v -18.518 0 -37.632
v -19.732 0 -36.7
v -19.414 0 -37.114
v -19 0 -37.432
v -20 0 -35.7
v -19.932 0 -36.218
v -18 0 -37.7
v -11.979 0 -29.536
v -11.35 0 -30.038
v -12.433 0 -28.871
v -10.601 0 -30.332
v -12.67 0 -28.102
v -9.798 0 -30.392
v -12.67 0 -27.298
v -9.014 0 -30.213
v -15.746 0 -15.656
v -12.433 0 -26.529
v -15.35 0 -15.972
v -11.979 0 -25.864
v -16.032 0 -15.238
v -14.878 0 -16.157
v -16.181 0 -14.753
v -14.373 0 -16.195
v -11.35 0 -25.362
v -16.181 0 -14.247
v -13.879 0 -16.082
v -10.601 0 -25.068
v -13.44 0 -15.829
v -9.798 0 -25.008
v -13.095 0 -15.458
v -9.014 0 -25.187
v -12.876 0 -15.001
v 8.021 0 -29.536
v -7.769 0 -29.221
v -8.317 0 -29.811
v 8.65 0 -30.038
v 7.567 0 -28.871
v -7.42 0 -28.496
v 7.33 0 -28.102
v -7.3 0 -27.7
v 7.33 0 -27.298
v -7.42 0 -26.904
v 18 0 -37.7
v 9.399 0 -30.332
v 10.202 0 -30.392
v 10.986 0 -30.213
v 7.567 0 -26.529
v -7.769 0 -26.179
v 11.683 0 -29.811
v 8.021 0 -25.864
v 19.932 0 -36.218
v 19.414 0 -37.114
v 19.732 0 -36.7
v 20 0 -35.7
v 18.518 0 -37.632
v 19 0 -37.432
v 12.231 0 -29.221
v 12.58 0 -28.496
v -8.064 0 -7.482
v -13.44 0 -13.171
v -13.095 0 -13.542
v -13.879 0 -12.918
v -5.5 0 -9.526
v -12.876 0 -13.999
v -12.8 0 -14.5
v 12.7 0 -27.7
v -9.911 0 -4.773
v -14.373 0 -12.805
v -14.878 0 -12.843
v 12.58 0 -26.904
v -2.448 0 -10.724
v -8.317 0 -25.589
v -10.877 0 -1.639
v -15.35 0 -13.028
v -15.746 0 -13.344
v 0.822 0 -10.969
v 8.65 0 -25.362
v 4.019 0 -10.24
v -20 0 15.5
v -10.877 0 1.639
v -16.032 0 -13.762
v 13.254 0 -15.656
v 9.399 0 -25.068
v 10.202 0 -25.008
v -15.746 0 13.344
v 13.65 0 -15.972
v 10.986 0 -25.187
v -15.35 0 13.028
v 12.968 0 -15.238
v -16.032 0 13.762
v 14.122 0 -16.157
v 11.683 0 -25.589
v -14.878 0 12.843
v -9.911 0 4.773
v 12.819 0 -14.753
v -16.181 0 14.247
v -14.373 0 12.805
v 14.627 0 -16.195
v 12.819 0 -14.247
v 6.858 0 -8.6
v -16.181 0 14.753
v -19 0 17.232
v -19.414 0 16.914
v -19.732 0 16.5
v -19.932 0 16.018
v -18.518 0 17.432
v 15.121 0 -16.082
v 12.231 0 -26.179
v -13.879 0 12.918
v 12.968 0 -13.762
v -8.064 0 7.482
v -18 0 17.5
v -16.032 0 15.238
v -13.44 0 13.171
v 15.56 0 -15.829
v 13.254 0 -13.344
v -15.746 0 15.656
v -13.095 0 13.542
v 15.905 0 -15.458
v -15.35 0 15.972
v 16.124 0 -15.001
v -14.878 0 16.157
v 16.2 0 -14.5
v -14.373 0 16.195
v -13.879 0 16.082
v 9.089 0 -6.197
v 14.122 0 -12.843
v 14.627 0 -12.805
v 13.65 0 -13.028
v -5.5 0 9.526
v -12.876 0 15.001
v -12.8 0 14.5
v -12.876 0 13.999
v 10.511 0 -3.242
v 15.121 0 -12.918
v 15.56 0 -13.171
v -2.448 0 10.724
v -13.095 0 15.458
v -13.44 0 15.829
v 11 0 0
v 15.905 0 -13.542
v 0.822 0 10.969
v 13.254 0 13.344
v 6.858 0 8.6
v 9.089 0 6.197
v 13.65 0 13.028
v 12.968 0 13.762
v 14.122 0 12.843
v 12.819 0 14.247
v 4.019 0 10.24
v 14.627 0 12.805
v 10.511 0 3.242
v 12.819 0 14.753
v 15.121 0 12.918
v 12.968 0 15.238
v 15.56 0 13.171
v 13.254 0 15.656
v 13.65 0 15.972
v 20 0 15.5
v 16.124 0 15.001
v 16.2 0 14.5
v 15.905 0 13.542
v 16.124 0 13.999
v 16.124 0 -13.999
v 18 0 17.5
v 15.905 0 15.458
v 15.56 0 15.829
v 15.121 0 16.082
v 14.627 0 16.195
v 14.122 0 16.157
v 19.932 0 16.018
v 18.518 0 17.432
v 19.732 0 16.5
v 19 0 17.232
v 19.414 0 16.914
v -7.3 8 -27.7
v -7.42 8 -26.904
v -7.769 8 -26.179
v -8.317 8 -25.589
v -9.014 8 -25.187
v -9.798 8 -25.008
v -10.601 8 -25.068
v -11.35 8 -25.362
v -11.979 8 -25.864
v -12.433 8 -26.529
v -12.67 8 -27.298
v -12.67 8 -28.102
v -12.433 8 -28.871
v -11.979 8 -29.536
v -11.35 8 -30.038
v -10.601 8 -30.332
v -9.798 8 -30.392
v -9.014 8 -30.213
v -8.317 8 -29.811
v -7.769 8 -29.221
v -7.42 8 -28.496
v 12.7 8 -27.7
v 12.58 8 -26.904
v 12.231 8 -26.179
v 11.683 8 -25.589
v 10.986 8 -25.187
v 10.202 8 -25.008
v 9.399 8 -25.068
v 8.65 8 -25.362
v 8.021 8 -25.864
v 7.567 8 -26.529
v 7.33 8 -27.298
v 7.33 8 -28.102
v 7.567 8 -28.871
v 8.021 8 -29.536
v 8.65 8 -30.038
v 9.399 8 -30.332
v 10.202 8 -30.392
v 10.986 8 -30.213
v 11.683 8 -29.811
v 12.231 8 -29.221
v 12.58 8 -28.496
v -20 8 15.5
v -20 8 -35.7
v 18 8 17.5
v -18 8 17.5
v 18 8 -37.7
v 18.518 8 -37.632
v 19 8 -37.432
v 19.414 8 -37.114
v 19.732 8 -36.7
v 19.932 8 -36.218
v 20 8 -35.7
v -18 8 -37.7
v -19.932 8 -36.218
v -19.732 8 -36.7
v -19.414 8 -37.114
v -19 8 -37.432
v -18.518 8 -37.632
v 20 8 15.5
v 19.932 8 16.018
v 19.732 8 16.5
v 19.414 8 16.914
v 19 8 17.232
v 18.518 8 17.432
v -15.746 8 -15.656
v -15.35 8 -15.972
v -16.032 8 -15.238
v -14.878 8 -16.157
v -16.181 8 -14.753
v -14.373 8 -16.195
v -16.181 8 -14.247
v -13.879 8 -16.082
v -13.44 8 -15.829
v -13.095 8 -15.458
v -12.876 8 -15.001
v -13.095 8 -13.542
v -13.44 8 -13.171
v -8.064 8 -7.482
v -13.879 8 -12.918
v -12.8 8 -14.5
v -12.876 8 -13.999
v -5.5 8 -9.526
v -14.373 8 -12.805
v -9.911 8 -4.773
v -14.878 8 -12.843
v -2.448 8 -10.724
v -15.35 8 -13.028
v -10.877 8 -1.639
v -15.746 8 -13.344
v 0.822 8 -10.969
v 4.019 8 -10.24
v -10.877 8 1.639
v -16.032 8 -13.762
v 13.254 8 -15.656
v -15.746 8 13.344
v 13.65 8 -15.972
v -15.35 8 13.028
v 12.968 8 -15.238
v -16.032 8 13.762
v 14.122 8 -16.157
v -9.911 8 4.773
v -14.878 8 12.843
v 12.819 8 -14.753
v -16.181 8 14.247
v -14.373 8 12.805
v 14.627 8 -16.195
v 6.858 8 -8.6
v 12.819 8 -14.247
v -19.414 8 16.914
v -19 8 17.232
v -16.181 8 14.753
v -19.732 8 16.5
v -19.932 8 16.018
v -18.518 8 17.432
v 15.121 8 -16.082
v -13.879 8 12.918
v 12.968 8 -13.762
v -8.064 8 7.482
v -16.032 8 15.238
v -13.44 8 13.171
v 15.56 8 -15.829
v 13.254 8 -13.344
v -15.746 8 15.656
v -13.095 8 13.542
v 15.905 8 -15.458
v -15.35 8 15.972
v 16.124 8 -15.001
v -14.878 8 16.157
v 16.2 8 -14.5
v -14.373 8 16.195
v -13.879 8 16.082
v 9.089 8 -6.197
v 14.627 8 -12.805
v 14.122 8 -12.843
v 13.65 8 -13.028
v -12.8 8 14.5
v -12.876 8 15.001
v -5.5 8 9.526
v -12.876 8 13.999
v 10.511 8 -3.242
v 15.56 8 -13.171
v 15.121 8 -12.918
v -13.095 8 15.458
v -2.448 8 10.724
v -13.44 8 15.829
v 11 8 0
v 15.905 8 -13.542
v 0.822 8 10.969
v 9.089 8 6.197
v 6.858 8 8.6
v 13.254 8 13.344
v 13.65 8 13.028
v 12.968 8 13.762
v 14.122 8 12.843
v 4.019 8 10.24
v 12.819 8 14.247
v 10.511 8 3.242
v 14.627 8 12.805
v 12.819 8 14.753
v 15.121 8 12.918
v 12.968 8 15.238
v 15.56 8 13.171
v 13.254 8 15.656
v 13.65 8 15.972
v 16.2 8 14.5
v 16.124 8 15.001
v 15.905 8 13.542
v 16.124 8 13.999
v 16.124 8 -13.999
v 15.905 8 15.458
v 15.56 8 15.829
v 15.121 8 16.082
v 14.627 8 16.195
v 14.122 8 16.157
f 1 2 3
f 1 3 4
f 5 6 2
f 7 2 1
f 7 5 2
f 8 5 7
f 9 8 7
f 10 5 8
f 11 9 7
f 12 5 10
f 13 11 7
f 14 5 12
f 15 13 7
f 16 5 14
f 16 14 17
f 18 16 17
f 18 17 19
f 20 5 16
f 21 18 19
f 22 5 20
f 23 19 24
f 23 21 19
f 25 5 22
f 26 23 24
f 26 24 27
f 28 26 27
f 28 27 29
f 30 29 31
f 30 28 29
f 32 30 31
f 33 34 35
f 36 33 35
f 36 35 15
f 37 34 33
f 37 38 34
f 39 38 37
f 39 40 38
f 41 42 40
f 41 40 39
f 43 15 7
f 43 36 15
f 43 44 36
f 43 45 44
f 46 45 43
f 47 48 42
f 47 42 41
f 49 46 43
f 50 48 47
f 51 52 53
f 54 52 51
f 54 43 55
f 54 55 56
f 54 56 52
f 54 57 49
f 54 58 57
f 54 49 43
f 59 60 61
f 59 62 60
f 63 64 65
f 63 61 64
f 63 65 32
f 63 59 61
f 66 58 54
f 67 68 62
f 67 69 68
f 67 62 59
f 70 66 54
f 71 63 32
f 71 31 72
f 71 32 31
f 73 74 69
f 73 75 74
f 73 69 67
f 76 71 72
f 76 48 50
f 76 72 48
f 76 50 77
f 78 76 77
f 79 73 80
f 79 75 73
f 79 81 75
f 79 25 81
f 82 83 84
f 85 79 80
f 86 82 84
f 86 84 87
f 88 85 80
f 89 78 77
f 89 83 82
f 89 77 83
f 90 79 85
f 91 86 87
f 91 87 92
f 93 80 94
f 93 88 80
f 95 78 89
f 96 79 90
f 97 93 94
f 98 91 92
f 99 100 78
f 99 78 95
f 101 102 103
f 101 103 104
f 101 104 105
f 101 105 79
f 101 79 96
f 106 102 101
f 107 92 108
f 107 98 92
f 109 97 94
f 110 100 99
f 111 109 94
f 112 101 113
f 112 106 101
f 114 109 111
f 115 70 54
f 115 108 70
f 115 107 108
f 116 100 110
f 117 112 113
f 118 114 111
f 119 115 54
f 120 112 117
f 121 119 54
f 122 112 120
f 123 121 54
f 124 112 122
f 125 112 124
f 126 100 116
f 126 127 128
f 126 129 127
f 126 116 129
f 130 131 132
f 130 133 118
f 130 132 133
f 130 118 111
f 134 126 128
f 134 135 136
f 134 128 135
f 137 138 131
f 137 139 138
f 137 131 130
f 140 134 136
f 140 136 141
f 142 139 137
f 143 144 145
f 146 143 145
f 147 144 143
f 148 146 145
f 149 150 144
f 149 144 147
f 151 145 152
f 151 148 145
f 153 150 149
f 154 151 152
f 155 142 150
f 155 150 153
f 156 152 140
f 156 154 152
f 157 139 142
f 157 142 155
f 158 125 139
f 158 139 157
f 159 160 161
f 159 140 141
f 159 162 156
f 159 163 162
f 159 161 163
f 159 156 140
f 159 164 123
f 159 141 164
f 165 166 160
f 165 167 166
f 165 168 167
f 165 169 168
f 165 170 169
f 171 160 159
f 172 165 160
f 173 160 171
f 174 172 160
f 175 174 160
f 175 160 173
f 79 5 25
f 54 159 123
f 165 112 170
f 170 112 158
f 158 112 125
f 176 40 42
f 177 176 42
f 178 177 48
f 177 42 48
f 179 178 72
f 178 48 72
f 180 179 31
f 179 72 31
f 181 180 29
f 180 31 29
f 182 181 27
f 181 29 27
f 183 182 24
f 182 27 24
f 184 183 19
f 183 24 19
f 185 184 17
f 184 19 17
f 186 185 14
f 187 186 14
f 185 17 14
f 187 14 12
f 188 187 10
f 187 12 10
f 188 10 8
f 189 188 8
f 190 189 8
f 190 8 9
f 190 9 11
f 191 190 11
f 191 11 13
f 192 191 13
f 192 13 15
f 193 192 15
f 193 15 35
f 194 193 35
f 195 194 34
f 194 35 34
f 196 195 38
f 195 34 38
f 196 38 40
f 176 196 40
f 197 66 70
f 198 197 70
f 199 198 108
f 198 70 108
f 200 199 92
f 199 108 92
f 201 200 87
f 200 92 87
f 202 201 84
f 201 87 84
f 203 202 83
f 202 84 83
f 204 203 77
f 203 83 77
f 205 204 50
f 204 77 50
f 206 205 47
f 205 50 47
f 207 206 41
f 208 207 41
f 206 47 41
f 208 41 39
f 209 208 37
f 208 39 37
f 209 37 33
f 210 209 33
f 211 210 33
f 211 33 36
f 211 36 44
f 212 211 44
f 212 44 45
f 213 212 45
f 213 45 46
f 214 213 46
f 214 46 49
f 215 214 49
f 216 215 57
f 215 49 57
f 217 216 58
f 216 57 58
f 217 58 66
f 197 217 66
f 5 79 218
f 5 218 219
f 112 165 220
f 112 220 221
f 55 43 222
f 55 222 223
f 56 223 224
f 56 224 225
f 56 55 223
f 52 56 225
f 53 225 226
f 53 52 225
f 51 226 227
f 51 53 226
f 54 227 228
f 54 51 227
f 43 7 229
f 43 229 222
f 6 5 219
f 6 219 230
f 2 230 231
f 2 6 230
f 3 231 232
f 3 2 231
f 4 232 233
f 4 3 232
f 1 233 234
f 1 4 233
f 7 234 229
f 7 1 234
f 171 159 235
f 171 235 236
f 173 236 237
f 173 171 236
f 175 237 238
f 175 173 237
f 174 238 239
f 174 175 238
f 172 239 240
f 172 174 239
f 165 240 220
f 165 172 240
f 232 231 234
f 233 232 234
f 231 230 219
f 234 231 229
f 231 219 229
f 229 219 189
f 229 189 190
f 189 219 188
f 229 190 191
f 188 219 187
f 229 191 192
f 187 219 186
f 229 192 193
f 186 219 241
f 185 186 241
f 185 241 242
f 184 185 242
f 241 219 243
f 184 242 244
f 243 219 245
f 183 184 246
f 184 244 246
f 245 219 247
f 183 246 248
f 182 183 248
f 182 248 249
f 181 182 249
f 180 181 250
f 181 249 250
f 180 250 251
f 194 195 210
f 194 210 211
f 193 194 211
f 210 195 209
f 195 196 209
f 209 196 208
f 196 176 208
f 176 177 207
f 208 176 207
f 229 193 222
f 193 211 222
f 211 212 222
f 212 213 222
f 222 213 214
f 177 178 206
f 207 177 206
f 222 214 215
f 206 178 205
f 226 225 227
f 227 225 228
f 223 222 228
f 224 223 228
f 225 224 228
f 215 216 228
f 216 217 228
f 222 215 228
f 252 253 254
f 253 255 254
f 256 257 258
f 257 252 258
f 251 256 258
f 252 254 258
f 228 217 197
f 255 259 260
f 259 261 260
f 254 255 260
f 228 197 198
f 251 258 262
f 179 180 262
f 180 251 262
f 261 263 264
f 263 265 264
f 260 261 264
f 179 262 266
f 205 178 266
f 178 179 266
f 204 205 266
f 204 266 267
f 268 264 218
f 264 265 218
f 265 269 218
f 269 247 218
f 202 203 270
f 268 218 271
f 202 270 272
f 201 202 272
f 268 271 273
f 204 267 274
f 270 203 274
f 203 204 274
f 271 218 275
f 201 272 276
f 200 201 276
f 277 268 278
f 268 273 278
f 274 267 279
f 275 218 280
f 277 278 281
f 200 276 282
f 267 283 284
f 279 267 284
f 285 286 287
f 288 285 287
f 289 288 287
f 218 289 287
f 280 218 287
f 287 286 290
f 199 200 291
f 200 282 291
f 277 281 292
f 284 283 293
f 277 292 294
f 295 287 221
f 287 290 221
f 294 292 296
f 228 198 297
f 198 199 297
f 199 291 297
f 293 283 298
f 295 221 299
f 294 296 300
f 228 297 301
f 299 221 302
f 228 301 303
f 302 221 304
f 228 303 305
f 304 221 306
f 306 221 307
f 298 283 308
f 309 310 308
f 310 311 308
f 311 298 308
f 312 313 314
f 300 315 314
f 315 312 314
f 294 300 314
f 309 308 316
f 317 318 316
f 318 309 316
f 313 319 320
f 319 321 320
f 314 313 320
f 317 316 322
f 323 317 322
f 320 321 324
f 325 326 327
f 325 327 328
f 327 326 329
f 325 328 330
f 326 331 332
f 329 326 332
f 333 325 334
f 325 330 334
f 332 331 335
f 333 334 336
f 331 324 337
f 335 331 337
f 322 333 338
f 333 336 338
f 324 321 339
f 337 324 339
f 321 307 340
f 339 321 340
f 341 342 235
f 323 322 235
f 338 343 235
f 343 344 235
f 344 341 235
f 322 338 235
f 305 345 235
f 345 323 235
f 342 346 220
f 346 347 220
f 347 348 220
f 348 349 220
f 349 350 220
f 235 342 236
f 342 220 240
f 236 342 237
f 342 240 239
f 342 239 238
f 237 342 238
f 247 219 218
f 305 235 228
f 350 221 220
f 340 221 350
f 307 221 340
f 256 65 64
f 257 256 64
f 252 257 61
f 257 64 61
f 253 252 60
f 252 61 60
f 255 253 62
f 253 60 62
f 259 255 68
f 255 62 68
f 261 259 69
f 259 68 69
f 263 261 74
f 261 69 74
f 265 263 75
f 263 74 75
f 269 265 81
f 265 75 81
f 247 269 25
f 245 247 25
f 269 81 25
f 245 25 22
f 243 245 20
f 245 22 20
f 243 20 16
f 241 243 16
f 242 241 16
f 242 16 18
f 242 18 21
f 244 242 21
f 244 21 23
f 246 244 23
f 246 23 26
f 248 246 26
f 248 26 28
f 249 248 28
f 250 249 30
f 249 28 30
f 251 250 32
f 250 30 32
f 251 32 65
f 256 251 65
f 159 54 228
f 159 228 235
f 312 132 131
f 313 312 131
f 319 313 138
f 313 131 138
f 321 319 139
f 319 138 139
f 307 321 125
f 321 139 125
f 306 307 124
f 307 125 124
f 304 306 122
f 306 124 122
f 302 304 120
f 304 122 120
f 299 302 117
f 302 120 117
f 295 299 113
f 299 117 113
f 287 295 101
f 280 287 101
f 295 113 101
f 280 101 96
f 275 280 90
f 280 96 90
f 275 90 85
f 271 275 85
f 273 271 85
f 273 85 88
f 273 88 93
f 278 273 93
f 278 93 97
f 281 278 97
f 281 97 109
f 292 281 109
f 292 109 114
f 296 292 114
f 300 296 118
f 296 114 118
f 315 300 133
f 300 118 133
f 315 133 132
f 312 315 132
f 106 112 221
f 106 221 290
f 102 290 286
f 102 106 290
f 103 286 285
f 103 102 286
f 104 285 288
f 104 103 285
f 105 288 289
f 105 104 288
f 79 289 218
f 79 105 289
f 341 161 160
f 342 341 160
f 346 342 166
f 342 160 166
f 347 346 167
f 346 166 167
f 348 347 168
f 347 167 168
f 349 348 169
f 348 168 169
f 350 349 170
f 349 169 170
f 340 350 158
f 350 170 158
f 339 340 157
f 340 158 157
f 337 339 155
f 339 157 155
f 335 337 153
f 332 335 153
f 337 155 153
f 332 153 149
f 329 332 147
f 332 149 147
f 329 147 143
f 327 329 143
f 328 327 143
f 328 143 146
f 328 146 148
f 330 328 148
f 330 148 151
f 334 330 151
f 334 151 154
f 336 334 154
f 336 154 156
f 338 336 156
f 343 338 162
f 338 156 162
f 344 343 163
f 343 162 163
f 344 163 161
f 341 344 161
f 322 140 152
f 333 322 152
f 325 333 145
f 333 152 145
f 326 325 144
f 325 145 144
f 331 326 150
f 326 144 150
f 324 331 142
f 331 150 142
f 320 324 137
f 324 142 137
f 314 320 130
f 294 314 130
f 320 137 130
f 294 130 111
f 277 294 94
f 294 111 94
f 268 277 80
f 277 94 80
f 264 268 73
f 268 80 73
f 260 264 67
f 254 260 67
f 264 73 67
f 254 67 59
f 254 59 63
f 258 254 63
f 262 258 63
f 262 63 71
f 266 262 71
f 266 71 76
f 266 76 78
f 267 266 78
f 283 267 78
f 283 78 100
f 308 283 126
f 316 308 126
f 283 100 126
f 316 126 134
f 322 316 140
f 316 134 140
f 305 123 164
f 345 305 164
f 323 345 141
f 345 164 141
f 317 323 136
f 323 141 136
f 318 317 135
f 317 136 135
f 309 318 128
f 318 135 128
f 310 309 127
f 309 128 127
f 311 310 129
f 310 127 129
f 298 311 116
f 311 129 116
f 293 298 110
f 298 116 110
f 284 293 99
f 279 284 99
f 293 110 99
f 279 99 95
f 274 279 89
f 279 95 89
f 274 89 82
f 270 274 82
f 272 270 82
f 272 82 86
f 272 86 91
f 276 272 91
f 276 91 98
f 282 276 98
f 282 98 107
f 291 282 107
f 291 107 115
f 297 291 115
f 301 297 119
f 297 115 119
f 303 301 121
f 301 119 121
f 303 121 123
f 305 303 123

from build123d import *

# Parameters (mm, degrees)
F0_R     = 2.7
F0_R_2   = 1.7
F0_R_3   = 11
F1_DEPTH = 8


with BuildPart() as f1:
    # F0 (on Front) → F1 (new body)
    with BuildSketch(Plane.XZ):
        with BuildLine():
            ThreePointArc((-18, 17.5), (-19.414214, 16.914214), (-20, 15.5))
            Line((-20, 15.5), (-20, -35.7))
            ThreePointArc((-20, -35.7), (-19.414214, -37.114214), (-18, -37.7))
            Line((-18, -37.7), (18, -37.7))
            ThreePointArc((18, -37.7), (19.414214, -37.114214), (20, -35.7))
            Line((20, -35.7), (20, 15.5))
            ThreePointArc((20, 15.5), (19.414214, 16.914214), (18, 17.5))
            Line((18, 17.5), (-18, 17.5))
        make_face()
        with Locations((-10, -27.7)):
            Circle(F0_R, mode=Mode.SUBTRACT)
        with Locations((-14.5, -14.5)):
            Circle(F0_R_2, mode=Mode.SUBTRACT)
        with Locations((10, -27.7)):
            Circle(F0_R, mode=Mode.SUBTRACT)
        with Locations((14.5, -14.5)):
            Circle(F0_R_2, mode=Mode.SUBTRACT)
        with Locations((-14.5, 14.5)):
            Circle(F0_R_2, mode=Mode.SUBTRACT)
        Circle(F0_R_3, mode=Mode.SUBTRACT)
        with Locations((14.5, 14.5)):
            Circle(F0_R_2, mode=Mode.SUBTRACT)
    extrude(amount=-F1_DEPTH)


solid = f1.part
